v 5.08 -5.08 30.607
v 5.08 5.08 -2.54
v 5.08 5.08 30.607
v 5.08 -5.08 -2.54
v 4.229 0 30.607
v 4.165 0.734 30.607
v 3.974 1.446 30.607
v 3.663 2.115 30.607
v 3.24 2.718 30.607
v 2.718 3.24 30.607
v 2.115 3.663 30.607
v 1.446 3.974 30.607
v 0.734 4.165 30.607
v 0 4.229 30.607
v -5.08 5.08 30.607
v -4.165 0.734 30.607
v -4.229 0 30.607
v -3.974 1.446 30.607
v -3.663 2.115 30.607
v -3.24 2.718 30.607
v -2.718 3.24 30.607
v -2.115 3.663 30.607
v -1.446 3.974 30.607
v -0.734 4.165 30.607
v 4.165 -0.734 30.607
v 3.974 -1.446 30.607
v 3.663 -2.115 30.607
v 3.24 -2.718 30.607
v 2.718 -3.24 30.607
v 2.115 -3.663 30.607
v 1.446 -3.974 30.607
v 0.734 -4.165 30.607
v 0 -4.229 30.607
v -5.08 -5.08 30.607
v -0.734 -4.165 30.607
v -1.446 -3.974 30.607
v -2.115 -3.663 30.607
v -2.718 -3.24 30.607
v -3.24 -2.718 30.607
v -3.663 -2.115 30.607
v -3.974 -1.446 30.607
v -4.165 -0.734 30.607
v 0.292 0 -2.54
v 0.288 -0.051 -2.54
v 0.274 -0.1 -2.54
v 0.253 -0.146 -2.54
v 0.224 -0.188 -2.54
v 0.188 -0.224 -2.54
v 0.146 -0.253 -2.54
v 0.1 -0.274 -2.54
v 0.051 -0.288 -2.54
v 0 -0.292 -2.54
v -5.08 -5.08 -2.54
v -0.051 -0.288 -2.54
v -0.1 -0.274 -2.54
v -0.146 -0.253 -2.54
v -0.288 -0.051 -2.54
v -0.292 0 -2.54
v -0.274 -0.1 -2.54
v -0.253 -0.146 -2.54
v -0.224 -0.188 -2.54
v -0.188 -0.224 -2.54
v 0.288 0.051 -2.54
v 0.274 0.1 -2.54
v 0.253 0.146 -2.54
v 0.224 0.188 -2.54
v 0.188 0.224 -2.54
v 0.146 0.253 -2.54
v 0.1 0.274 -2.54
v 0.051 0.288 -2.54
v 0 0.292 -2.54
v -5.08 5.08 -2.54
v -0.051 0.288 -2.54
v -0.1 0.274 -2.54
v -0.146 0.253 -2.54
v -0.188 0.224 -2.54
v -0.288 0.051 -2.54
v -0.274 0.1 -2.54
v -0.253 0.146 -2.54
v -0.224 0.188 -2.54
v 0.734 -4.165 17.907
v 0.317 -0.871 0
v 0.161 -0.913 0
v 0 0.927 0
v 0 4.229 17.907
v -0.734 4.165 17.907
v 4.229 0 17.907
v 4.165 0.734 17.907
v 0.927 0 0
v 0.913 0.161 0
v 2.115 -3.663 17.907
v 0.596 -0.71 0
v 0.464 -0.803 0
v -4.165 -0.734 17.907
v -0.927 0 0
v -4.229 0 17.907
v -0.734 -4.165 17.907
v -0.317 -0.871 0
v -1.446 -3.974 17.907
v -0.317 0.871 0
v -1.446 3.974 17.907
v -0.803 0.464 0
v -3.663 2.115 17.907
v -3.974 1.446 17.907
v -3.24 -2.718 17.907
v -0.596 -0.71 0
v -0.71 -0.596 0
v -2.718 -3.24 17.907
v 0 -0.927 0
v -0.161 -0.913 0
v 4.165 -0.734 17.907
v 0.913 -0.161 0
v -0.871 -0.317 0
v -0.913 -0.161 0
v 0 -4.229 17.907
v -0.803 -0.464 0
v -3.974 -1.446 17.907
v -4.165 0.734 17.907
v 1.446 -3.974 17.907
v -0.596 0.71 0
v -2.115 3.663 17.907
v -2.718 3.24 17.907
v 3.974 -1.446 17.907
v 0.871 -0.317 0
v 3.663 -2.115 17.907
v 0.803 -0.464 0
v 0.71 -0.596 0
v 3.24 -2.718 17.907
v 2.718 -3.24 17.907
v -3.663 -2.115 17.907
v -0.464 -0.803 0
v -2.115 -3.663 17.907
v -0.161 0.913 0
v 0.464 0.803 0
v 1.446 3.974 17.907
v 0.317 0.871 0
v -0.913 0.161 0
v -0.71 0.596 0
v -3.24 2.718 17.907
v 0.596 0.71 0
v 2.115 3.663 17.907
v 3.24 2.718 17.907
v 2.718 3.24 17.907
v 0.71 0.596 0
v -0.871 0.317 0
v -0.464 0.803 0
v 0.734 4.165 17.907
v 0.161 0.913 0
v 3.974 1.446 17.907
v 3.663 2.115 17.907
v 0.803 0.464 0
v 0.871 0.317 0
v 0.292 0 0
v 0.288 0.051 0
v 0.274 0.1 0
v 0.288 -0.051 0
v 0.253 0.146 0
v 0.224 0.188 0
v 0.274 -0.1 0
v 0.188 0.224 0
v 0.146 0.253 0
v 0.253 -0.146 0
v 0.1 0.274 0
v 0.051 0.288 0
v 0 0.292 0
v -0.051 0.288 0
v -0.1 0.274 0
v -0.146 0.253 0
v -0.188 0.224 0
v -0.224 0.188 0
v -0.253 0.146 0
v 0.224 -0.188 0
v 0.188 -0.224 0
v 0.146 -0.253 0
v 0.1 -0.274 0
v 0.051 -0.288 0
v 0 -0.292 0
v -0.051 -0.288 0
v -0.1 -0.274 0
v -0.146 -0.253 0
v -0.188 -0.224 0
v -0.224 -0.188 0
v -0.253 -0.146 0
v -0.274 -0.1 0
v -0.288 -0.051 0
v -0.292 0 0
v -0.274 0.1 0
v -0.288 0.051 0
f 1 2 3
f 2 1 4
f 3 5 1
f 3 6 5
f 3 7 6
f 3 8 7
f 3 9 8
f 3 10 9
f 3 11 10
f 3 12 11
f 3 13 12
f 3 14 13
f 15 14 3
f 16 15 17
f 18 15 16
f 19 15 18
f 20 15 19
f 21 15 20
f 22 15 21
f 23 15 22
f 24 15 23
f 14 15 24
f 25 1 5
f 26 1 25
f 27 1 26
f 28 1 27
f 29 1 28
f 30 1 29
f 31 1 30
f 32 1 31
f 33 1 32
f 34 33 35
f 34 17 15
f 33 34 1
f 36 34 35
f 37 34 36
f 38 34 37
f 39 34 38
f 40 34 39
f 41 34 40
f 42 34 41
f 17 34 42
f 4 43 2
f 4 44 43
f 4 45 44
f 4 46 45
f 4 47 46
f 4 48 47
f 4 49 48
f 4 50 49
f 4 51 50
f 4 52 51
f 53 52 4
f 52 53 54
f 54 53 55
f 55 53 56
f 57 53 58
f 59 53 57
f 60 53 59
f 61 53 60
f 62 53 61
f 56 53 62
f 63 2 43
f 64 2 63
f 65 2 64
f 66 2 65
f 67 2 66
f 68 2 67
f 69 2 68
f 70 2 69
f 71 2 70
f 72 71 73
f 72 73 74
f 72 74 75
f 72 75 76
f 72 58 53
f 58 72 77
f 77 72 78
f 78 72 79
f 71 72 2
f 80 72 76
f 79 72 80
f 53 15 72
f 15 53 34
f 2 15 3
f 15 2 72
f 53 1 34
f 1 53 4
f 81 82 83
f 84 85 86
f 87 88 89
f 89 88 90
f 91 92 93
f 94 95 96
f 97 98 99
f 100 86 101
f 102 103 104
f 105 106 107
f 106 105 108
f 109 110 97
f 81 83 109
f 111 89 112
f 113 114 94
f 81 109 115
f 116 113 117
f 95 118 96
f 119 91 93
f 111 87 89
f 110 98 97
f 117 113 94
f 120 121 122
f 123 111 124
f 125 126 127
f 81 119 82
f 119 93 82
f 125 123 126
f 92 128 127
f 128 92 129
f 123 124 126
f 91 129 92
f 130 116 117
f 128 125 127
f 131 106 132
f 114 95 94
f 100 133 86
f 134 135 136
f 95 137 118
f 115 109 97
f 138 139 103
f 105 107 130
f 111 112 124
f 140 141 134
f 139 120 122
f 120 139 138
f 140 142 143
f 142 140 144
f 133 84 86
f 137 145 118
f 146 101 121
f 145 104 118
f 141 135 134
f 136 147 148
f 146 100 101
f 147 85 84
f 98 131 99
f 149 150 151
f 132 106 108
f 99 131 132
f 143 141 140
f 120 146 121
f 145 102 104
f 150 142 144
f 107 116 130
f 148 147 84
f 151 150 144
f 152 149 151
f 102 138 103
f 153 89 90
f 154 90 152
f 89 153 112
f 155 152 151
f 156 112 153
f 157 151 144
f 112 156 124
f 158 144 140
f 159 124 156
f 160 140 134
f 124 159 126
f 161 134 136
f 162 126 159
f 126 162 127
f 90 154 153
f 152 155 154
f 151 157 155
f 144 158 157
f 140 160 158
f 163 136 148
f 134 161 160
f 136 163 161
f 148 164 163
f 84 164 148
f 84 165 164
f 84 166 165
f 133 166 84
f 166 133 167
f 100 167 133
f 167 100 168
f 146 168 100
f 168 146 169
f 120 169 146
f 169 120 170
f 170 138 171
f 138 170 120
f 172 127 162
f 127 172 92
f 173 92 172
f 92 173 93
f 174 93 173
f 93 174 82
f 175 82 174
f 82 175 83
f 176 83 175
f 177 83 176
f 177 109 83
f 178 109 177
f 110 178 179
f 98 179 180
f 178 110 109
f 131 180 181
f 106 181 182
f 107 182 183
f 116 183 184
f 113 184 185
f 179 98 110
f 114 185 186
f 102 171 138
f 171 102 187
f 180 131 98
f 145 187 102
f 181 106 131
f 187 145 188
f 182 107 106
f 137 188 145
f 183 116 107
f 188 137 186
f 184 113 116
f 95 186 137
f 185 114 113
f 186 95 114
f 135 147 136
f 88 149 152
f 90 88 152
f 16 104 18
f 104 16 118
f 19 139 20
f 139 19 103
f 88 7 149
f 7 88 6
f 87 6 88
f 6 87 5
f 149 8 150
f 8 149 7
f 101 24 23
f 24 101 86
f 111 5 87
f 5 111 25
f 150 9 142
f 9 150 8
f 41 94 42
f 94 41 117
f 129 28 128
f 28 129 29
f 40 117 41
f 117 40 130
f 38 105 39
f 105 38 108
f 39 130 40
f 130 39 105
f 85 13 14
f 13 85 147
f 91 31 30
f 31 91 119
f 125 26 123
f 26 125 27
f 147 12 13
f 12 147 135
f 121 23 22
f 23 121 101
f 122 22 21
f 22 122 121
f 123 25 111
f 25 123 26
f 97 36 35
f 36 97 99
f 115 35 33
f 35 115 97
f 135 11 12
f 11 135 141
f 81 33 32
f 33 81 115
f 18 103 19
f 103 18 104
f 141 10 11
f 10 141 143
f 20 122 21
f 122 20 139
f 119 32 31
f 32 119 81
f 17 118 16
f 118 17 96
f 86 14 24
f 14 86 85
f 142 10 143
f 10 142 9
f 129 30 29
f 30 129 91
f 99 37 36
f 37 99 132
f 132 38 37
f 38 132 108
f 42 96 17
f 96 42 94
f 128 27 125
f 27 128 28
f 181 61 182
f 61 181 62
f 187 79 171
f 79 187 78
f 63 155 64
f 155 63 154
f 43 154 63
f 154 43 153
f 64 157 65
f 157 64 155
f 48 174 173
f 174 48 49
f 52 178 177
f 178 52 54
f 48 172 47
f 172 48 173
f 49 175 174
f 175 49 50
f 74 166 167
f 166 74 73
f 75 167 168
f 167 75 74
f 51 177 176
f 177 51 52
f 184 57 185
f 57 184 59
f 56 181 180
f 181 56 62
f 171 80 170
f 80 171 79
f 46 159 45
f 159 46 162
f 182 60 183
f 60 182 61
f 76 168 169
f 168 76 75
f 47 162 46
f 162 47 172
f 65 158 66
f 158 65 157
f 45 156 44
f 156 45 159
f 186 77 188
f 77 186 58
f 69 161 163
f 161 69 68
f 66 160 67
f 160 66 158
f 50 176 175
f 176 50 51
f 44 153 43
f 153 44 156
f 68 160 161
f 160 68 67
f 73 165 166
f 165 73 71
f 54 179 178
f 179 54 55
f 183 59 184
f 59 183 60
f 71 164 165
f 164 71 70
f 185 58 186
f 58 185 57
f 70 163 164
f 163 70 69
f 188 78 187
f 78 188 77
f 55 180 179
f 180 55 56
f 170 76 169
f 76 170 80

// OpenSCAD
inches_to_mm = 25.4;
pencil_padding = 0.003;
spacing = 0.2;

difference() {
  translate([-1 * spacing * inches_to_mm, -1 * spacing * inches_to_mm,-0.1 * inches_to_mm]) {
    cube([spacing * 2.0 * inches_to_mm, spacing * 2.0 * inches_to_mm, 1.305 * inches_to_mm]);
  }
  cylinder(h=0.705 * inches_to_mm, d1=(0.07 + pencil_padding) * inches_to_mm, d2=(0.33 + pencil_padding) * inches_to_mm, $fn=36);
  translate([0,0,0.705 * inches_to_mm]) {
    cylinder(h=0.5 * inches_to_mm, d=(0.33 + pencil_padding) * inches_to_mm, $fn=36);
  }
  translate([0,0,-0.5 * inches_to_mm]){
    cylinder(h=0.7 * inches_to_mm, d=(0.02 + pencil_padding) * inches_to_mm, $fn=36);
  }
}
